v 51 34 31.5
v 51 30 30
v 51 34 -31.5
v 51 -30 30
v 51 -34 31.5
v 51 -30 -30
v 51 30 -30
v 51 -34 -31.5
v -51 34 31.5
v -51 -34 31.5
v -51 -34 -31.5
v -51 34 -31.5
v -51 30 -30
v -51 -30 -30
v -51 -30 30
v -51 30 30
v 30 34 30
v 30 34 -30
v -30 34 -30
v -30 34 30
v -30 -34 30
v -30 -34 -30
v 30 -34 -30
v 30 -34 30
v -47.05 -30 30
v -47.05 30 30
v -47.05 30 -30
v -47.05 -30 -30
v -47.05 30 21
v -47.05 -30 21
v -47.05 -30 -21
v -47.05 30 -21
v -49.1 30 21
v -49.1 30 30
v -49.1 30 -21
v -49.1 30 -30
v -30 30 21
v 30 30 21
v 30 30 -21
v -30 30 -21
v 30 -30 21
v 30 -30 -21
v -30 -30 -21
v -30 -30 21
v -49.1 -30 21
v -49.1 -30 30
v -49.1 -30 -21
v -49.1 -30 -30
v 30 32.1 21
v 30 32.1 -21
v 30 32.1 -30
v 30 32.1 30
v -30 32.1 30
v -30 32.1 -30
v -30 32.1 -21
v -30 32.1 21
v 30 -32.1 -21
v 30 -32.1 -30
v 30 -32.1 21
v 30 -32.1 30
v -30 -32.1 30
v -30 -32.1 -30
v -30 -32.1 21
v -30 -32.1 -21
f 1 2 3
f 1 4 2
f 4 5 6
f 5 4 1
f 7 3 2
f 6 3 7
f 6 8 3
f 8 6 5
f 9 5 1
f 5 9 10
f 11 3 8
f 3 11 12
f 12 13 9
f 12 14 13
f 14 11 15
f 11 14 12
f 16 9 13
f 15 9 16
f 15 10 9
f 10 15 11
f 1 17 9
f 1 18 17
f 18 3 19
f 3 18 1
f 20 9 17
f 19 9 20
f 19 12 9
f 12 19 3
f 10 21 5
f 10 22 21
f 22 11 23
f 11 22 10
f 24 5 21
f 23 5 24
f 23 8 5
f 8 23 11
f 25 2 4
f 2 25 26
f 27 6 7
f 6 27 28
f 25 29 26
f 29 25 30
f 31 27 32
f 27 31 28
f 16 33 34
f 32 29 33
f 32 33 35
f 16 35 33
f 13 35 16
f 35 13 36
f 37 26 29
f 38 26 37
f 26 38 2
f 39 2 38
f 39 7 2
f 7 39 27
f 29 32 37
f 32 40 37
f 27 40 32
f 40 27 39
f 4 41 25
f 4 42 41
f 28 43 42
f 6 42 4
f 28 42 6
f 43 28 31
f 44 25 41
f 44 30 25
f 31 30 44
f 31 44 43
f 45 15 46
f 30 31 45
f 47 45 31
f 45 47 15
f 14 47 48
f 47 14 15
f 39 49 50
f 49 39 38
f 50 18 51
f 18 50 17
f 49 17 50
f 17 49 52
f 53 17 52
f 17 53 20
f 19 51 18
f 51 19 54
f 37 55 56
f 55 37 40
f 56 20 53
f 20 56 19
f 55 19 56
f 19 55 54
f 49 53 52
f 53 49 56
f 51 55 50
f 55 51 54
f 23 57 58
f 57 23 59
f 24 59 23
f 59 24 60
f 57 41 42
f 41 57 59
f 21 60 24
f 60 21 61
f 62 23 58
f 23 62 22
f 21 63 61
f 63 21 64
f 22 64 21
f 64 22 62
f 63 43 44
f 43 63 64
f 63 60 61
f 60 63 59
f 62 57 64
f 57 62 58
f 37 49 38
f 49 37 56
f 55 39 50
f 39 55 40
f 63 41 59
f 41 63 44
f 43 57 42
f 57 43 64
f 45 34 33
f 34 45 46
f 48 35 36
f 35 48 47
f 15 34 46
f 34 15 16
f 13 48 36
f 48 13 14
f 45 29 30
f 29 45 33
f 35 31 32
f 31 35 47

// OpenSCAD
/*inner hull of a 3 way electrical outlet-*/

module inner_hull() {
	difference(){
		cube([102,68,63],center=true);
		translate([4,0,0]) cube([102.1,60,60],center=true);
		translate([-30,32.1,-30])cube([60,2,60]);
		translate([-30,-34.1,-30])cube([60,2,60]);
		translate([-30,29.7,-21])cube([60,3,42]);
		translate([-30,-32.9,-21])cube([60,3,42]);
		translate([-51.1,-30,-30])cube([2,60,60]);
		translate([-49.15,-30,-21])cube([3,60,42]);
	}
}

inner_hull();

/*end comment*/
